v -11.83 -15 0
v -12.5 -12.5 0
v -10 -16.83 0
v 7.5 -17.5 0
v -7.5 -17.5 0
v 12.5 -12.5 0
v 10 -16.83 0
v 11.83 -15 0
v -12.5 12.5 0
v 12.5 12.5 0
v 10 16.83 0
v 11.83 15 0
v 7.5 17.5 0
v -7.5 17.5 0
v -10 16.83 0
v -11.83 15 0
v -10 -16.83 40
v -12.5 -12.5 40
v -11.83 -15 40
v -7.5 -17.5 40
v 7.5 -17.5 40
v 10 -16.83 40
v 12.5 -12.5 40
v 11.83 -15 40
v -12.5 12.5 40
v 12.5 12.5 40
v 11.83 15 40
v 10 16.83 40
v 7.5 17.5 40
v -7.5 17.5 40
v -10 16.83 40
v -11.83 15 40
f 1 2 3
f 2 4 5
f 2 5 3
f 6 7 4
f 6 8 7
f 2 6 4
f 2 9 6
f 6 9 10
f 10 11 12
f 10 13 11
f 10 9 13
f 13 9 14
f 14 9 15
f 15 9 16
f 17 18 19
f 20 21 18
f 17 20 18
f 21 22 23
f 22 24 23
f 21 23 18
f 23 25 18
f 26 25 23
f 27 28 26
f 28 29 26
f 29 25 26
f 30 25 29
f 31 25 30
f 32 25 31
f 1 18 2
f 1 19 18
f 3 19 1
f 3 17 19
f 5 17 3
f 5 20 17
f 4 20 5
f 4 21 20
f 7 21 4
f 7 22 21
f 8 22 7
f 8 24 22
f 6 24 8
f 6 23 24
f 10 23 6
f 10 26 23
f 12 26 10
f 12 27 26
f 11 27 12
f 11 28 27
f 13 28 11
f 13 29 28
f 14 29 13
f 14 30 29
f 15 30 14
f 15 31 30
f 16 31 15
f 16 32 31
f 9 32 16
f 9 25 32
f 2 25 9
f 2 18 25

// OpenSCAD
// You could simply do it this way if you have the boxes.scad
// file in your library
//use <boxes.scad>
//roundedBox([20, 30, 40], 5, true); 

// Or, you could do it this way if you want to roll your own
roundedRect([20, 30, 40], 5, $fn=12);

// size - [x,y,z]
// radius - radius of corners
module roundedRect(size, radius)
{
	x = size[0];
	y = size[1];
	z = size[2];

	linear_extrude(height=z)
	hull()
	{
		// place 4 circles in the corners, with the given radius
		translate([(-x/2)+(radius/2), (-y/2)+(radius/2), 0])
		circle(r=radius);
	
		translate([(x/2)-(radius/2), (-y/2)+(radius/2), 0])
		circle(r=radius);
	
		translate([(-x/2)+(radius/2), (y/2)-(radius/2), 0])
		circle(r=radius);
	
		translate([(x/2)-(radius/2), (y/2)-(radius/2), 0])
		circle(r=radius);
	}
}
